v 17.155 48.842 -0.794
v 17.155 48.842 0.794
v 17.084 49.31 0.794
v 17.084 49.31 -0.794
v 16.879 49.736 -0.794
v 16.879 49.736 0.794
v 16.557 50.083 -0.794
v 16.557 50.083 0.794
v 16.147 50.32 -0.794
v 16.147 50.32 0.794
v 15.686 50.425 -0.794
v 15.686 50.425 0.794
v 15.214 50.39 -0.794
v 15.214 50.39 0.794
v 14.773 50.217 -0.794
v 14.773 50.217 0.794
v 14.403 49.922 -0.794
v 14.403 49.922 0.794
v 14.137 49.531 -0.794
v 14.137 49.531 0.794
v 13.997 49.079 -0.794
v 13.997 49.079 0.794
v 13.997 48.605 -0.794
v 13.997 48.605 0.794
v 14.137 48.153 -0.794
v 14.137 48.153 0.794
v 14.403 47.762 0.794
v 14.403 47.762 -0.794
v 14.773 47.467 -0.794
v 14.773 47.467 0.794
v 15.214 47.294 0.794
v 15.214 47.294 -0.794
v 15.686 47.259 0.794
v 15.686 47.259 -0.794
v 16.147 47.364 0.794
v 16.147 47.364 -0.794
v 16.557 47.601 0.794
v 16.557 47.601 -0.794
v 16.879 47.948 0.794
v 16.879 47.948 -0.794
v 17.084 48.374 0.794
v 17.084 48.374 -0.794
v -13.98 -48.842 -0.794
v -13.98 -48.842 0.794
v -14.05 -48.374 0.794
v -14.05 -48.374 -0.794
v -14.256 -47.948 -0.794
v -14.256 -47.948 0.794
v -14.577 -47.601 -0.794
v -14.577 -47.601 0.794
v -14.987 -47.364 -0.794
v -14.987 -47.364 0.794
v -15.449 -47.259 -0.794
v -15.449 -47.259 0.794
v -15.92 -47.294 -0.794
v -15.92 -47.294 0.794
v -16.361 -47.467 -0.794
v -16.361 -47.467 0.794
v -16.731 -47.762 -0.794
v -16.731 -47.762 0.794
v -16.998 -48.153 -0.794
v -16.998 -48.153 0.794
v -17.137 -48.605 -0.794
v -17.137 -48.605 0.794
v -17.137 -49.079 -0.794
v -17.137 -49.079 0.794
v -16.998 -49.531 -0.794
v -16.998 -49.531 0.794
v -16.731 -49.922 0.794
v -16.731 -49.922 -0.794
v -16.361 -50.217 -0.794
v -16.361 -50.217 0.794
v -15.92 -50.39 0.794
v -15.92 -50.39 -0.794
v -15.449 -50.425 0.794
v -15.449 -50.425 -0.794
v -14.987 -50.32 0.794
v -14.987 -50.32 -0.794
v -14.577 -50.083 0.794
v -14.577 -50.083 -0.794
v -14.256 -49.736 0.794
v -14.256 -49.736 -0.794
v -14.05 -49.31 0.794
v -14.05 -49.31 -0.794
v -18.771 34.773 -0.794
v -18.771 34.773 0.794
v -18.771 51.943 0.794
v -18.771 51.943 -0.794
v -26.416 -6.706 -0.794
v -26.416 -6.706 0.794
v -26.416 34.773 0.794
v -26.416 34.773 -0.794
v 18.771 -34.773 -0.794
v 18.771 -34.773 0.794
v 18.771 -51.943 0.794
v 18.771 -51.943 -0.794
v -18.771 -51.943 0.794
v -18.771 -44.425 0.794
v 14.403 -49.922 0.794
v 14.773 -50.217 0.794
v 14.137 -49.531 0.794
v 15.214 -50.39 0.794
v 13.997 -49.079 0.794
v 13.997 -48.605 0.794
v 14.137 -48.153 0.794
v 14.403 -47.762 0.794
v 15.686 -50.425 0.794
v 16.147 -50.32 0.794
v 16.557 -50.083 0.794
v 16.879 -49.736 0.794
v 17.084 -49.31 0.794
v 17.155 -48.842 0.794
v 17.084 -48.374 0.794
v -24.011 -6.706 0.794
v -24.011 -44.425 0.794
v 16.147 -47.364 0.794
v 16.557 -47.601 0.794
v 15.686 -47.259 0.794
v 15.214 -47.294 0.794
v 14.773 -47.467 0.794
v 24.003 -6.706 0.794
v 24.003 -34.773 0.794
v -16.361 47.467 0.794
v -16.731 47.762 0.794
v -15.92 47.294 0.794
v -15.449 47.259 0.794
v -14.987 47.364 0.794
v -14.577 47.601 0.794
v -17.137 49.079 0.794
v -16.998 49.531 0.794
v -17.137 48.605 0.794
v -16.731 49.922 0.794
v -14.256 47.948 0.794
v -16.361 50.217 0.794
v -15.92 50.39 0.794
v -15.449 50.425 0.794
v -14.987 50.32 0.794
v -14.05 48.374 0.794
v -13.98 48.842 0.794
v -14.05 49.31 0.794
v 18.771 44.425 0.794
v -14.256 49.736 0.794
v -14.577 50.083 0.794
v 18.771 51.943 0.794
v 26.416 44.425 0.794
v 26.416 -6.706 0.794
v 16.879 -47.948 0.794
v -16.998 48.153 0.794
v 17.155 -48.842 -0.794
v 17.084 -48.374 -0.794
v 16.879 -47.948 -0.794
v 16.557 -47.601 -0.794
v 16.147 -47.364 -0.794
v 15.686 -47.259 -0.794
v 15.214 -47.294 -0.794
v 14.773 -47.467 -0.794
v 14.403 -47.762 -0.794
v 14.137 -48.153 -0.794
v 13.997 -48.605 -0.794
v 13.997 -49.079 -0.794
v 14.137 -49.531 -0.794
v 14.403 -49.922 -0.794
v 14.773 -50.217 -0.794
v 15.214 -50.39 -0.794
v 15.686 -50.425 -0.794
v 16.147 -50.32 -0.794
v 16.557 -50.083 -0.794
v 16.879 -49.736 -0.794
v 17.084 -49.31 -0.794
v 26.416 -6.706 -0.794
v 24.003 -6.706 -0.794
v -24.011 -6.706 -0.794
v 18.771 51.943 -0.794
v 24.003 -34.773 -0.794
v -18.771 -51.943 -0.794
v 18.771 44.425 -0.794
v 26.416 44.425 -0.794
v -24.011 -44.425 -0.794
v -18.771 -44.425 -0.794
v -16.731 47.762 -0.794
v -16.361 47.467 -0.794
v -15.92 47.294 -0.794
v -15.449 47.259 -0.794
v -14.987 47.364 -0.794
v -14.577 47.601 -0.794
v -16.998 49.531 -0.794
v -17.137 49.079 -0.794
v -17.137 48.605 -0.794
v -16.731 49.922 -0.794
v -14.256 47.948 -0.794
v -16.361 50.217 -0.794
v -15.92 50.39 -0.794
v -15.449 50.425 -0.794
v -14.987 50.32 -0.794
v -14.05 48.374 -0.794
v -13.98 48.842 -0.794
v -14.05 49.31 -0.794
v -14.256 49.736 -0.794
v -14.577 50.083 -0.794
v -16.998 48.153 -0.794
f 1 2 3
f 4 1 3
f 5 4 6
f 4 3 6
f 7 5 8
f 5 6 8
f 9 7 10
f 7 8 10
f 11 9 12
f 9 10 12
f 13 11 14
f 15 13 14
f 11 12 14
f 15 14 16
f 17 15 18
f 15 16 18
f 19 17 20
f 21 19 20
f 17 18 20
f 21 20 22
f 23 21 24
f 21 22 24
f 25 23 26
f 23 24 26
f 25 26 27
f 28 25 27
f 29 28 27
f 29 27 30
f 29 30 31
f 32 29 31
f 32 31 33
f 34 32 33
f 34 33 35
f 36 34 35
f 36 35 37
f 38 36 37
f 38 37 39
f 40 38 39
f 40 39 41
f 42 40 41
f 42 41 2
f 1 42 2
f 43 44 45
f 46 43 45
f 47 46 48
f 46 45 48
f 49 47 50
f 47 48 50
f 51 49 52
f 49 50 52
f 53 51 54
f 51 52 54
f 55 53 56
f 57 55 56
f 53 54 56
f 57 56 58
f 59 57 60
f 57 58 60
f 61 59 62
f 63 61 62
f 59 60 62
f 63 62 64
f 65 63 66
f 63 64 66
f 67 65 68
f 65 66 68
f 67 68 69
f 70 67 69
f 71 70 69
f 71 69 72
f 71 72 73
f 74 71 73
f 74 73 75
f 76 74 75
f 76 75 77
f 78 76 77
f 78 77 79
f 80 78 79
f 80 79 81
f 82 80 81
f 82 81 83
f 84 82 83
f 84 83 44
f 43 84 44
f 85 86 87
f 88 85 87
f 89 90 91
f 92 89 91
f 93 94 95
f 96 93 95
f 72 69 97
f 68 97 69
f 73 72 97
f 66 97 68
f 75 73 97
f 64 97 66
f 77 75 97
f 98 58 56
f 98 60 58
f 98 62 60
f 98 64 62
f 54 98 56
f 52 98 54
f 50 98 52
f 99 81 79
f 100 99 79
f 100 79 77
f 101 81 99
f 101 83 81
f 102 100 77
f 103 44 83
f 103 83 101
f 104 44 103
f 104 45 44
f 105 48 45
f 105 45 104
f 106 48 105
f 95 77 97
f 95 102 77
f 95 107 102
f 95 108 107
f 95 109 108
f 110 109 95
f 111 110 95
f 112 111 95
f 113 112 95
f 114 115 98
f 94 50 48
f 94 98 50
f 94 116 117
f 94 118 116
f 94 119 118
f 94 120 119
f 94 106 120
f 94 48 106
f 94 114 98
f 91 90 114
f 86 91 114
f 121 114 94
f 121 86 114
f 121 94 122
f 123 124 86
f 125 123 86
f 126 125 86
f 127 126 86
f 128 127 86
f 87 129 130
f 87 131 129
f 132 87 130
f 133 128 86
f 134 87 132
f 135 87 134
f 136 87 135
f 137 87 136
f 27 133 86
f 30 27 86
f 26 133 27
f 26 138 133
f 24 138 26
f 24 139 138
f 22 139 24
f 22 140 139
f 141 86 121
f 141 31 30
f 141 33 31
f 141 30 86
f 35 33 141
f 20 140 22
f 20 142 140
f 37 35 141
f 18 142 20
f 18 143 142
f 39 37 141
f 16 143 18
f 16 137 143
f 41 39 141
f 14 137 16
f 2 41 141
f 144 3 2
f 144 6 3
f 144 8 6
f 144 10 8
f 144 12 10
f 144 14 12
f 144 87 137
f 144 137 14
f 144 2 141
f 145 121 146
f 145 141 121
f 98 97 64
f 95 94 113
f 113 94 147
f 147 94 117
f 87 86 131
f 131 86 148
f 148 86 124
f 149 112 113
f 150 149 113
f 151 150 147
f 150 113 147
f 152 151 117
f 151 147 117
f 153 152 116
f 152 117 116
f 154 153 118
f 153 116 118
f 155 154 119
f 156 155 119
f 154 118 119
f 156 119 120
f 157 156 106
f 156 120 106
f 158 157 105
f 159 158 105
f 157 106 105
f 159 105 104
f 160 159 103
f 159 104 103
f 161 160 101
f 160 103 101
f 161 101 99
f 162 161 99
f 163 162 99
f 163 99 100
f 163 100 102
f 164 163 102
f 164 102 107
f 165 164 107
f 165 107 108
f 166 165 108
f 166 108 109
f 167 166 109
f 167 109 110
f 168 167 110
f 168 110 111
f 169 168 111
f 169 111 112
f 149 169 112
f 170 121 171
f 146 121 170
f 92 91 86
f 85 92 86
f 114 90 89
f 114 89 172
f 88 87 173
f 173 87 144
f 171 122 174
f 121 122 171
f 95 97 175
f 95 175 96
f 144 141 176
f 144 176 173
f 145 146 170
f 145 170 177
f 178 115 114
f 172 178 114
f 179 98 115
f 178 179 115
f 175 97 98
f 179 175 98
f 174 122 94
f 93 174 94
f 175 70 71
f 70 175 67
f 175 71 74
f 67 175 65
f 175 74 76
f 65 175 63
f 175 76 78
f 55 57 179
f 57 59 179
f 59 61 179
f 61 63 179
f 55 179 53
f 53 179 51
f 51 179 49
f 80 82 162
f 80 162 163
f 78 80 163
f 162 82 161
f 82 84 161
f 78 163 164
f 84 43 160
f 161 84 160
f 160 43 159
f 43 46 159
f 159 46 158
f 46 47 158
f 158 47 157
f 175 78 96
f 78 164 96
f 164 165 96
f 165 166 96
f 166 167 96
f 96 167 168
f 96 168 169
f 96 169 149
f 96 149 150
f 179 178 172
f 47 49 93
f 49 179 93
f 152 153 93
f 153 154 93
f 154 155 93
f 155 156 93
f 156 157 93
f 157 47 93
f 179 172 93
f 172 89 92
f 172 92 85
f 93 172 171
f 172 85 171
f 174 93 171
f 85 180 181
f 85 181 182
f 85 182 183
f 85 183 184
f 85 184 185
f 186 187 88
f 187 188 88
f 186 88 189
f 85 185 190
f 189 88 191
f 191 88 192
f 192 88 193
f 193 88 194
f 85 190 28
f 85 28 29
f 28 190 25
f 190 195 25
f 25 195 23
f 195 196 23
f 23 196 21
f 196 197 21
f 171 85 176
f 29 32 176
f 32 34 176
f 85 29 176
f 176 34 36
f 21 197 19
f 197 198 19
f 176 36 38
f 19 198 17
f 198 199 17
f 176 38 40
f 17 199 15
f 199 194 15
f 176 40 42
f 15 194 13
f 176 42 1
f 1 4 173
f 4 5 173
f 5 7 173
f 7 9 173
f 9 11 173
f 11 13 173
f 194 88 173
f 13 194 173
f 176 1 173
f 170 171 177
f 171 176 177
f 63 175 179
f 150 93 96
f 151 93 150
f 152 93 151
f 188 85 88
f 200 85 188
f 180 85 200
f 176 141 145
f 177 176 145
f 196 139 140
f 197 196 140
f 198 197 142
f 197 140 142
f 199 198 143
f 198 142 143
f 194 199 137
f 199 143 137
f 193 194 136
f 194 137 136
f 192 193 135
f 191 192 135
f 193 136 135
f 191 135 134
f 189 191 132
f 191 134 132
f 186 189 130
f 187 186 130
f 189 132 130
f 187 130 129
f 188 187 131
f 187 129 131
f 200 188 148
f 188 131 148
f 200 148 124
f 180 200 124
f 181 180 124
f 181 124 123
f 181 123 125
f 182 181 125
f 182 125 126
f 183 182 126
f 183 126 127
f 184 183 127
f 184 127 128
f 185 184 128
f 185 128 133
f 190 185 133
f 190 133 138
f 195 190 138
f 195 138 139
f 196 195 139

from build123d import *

# Parameters (mm, degrees)
F0_W     = 52.832
F0_H     = 103.886
F1_DEPTH = 0.79375
F2_W     = 7.6454
F2_H     = 17.1704
F2_H_2   = 7.5184
F2_W_2   = 2.405321
F2_H_3   = 37.719
F2_W_3   = 2.413
F2_H_4   = 28.067
F2_R     = 1.5875
F3_DEPTH = 1.6002


with BuildPart() as f1:
    # F0 (on Top) → F1 (new body, symmetric)
    with BuildSketch(Plane.XY):
        Rectangle(F0_W, F0_H)
    extrude(amount=F1_DEPTH, both=True)

    # F2 (on face) → F3 (cut)
    with BuildSketch(Plane.XY.offset(0.79375)):
        with Locations((-22.5933, 43.3578)):
            Rectangle(F2_W, F2_H)
        with Locations((22.5933, 48.1838)):
            Rectangle(F2_W, F2_H_2)
        Polygon((-26.416, -44.4246), (-26.416, -51.943), (-18.7706, -51.943), (-18.7706, -44.4246), (-24.010679, -44.4246), align=None)
        with Locations((-25.21334, -25.5651)):
            Rectangle(F2_W_2, F2_H_3)
        Polygon((18.7706, -51.943), (26.416, -51.943), (26.416, -34.7726), (24.003, -34.7726), (18.7706, -34.7726), align=None)
        with Locations((25.2095, -20.7391)):
            Rectangle(F2_W_3, F2_H_4)
        with Locations((-15.567212, 48.84192)):
            Circle(F2_R)
        with Locations((15.567212, 48.84192)):
            Circle(F2_R)
        with Locations((-15.567212, -48.84192)):
            Circle(F2_R)
        with Locations((15.567212, -48.84192)):
            Circle(F2_R)
    extrude(amount=-F3_DEPTH, mode=Mode.SUBTRACT)


solid = f1.part
